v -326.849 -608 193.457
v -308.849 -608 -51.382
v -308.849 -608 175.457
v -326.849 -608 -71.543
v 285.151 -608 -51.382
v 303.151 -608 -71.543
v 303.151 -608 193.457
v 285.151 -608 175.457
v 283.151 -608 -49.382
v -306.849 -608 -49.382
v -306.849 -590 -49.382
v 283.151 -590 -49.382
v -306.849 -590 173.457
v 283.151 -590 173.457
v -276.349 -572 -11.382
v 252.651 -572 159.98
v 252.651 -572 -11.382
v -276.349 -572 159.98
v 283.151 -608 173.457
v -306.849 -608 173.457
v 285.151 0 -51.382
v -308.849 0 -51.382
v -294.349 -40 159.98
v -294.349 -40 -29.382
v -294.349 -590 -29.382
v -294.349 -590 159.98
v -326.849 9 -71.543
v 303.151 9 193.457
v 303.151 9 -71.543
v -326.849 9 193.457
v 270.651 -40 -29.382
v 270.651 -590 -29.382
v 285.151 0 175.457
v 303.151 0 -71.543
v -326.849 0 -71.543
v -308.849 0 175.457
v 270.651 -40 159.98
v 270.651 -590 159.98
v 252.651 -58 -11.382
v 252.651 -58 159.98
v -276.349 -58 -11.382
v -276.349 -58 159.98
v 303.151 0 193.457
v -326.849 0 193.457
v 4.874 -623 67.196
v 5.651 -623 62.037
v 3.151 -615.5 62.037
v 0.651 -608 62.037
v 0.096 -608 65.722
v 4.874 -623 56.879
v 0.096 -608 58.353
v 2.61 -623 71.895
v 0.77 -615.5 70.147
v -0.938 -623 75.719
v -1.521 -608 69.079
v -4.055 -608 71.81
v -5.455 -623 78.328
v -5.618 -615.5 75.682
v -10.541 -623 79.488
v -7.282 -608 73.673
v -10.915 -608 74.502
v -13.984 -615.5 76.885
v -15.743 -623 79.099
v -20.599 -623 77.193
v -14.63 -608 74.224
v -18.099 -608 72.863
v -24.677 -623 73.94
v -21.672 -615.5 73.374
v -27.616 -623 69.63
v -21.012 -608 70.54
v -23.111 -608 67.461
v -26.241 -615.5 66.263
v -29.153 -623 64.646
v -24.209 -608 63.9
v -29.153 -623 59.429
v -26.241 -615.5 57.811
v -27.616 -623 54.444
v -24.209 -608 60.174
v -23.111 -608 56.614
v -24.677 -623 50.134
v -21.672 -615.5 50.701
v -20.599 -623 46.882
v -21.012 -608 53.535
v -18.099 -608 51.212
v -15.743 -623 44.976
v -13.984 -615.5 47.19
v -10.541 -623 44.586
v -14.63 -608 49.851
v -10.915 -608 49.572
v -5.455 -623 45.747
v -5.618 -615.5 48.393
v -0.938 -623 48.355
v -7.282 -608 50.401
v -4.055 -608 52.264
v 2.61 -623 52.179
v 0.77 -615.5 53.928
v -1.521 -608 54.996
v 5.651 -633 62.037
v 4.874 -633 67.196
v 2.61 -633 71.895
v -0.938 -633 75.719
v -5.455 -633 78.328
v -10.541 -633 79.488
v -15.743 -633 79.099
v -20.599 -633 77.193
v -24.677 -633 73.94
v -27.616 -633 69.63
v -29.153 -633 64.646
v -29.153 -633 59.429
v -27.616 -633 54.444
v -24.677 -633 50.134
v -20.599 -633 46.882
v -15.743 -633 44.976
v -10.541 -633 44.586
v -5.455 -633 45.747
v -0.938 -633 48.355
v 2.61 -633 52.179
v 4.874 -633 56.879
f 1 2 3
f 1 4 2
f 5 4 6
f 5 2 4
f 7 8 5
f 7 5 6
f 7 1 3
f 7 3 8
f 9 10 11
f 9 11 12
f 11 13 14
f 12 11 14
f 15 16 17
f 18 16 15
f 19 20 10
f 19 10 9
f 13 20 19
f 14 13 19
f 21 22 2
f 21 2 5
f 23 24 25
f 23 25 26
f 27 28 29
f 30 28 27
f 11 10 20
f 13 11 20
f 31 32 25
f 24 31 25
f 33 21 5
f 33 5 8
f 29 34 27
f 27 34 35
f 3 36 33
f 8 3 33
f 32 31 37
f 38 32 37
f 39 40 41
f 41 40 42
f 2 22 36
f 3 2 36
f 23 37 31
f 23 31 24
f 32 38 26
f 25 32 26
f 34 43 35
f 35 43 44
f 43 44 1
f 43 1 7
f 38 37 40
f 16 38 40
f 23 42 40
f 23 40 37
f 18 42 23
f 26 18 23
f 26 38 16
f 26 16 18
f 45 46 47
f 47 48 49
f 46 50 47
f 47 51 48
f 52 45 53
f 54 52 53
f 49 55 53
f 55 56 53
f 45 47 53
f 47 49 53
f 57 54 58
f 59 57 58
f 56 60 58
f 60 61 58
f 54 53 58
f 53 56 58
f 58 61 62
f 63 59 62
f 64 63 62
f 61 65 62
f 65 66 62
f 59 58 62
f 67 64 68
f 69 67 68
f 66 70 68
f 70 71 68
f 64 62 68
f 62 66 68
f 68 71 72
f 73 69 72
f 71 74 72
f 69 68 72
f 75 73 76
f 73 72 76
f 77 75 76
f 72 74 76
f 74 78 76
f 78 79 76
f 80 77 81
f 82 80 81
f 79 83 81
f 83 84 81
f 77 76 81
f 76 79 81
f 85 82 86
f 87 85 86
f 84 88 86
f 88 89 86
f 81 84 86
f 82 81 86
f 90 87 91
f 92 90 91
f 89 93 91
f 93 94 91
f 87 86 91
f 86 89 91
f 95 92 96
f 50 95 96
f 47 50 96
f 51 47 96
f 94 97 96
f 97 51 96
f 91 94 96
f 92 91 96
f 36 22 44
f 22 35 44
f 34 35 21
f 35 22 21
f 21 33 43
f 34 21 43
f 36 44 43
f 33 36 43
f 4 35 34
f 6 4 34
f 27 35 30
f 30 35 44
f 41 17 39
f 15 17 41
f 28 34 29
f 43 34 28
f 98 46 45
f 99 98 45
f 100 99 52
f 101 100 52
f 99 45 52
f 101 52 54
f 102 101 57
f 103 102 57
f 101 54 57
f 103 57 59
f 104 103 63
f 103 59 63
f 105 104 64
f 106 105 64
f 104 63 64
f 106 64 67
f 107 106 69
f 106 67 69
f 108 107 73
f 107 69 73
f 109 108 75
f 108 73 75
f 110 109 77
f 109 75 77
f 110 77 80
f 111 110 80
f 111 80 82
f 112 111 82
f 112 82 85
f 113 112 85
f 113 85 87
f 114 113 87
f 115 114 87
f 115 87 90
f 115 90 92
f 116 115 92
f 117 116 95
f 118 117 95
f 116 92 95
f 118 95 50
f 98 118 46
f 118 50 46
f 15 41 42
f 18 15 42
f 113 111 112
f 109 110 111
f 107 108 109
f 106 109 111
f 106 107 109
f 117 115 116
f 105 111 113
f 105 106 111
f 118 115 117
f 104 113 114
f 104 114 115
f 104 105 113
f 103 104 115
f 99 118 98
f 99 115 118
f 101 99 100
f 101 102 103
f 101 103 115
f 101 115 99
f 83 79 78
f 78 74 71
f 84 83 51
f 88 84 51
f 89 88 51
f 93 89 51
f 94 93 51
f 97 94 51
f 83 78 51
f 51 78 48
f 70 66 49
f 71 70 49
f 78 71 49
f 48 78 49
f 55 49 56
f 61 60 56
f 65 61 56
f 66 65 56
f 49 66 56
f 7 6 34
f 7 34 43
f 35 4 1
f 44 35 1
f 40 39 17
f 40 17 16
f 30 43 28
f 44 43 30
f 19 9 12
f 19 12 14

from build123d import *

# Parameters (mm, degrees)
F0_W      = 630
F0_H      = 265
F0_W_2    = 594
F0_H_2    = 226.838547
F1_DEPTH  = 608
F2_W      = 630
F2_H      = 265
F3_DEPTH  = 9
F4_W      = 590
F4_H      = 222.838547
F5_DEPTH  = 18
F6_W      = 565
F6_H      = 189.362255
F7_DEPTH  = 550
F8_T      = -18
F9_R      = 17.5
F10_DEPTH = 25
F11_SIZE2 = 5
F11_SIZE  = 15


with BuildPart() as f1:
    # F0 (on Front) → F1 (new body)
    with BuildSketch(Plane.XZ):
        with Locations((-11.848952, 60.956648)):
            Rectangle(F0_W, F0_H)
        with Locations((-11.848952, 62.037374)):
            Rectangle(F0_W_2, F0_H_2, mode=Mode.SUBTRACT)
    extrude(amount=F1_DEPTH)


with BuildPart() as f3:
    # F2 (on face) → F3 (new body)
    with BuildSketch(Plane(origin=(0, 0, 0), x_dir=(-1, 0, 0), z_dir=(0, 1, 0))):
        with Locations((11.848952, 60.956648)):
            Rectangle(F2_W, F2_H)
    extrude(amount=F3_DEPTH)


with BuildPart() as f5:
    # F4 (on face) → F5 (new body)
    with BuildSketch(Plane.XZ.offset(608)):
        with Locations((-11.848952, 62.037374)):
            Rectangle(F4_W, F4_H)
    extrude(amount=-F5_DEPTH)


with BuildPart() as f7:
    # F6 (on face) → F7 (new body)
    with BuildSketch(Plane(origin=(0, -590, 0), x_dir=(-1, 0, 0), z_dir=(0, 1, 0))):
        with Locations((11.848952, 65.299228)):
            Rectangle(F6_W, F6_H)
    extrude(amount=F7_DEPTH)

    # F8
    f8_openings = [f7.faces().sort_by_distance(p)[0] for p in [
        (-11.848952, -315, 159.980356),
    ]]
    offset(amount=F8_T, openings=f8_openings)


with BuildPart() as f10:
    # F9 (on face) → F10 (new body)
    with BuildSketch(Plane.XZ.offset(608)):
        with Locations((-11.848952, 62.037374)):
            Circle(F9_R)
    extrude(amount=F10_DEPTH)

    # F11
    f11_edges = [f10.edges().sort_by_distance(p)[0] for p in [
        (-29.348952, -608, 62.037374),
    ]]
    chamfer(f11_edges, length=F11_SIZE, length2=F11_SIZE2)


solid = Compound([f1.part, f3.part, f5.part, f7.part, f10.part])
